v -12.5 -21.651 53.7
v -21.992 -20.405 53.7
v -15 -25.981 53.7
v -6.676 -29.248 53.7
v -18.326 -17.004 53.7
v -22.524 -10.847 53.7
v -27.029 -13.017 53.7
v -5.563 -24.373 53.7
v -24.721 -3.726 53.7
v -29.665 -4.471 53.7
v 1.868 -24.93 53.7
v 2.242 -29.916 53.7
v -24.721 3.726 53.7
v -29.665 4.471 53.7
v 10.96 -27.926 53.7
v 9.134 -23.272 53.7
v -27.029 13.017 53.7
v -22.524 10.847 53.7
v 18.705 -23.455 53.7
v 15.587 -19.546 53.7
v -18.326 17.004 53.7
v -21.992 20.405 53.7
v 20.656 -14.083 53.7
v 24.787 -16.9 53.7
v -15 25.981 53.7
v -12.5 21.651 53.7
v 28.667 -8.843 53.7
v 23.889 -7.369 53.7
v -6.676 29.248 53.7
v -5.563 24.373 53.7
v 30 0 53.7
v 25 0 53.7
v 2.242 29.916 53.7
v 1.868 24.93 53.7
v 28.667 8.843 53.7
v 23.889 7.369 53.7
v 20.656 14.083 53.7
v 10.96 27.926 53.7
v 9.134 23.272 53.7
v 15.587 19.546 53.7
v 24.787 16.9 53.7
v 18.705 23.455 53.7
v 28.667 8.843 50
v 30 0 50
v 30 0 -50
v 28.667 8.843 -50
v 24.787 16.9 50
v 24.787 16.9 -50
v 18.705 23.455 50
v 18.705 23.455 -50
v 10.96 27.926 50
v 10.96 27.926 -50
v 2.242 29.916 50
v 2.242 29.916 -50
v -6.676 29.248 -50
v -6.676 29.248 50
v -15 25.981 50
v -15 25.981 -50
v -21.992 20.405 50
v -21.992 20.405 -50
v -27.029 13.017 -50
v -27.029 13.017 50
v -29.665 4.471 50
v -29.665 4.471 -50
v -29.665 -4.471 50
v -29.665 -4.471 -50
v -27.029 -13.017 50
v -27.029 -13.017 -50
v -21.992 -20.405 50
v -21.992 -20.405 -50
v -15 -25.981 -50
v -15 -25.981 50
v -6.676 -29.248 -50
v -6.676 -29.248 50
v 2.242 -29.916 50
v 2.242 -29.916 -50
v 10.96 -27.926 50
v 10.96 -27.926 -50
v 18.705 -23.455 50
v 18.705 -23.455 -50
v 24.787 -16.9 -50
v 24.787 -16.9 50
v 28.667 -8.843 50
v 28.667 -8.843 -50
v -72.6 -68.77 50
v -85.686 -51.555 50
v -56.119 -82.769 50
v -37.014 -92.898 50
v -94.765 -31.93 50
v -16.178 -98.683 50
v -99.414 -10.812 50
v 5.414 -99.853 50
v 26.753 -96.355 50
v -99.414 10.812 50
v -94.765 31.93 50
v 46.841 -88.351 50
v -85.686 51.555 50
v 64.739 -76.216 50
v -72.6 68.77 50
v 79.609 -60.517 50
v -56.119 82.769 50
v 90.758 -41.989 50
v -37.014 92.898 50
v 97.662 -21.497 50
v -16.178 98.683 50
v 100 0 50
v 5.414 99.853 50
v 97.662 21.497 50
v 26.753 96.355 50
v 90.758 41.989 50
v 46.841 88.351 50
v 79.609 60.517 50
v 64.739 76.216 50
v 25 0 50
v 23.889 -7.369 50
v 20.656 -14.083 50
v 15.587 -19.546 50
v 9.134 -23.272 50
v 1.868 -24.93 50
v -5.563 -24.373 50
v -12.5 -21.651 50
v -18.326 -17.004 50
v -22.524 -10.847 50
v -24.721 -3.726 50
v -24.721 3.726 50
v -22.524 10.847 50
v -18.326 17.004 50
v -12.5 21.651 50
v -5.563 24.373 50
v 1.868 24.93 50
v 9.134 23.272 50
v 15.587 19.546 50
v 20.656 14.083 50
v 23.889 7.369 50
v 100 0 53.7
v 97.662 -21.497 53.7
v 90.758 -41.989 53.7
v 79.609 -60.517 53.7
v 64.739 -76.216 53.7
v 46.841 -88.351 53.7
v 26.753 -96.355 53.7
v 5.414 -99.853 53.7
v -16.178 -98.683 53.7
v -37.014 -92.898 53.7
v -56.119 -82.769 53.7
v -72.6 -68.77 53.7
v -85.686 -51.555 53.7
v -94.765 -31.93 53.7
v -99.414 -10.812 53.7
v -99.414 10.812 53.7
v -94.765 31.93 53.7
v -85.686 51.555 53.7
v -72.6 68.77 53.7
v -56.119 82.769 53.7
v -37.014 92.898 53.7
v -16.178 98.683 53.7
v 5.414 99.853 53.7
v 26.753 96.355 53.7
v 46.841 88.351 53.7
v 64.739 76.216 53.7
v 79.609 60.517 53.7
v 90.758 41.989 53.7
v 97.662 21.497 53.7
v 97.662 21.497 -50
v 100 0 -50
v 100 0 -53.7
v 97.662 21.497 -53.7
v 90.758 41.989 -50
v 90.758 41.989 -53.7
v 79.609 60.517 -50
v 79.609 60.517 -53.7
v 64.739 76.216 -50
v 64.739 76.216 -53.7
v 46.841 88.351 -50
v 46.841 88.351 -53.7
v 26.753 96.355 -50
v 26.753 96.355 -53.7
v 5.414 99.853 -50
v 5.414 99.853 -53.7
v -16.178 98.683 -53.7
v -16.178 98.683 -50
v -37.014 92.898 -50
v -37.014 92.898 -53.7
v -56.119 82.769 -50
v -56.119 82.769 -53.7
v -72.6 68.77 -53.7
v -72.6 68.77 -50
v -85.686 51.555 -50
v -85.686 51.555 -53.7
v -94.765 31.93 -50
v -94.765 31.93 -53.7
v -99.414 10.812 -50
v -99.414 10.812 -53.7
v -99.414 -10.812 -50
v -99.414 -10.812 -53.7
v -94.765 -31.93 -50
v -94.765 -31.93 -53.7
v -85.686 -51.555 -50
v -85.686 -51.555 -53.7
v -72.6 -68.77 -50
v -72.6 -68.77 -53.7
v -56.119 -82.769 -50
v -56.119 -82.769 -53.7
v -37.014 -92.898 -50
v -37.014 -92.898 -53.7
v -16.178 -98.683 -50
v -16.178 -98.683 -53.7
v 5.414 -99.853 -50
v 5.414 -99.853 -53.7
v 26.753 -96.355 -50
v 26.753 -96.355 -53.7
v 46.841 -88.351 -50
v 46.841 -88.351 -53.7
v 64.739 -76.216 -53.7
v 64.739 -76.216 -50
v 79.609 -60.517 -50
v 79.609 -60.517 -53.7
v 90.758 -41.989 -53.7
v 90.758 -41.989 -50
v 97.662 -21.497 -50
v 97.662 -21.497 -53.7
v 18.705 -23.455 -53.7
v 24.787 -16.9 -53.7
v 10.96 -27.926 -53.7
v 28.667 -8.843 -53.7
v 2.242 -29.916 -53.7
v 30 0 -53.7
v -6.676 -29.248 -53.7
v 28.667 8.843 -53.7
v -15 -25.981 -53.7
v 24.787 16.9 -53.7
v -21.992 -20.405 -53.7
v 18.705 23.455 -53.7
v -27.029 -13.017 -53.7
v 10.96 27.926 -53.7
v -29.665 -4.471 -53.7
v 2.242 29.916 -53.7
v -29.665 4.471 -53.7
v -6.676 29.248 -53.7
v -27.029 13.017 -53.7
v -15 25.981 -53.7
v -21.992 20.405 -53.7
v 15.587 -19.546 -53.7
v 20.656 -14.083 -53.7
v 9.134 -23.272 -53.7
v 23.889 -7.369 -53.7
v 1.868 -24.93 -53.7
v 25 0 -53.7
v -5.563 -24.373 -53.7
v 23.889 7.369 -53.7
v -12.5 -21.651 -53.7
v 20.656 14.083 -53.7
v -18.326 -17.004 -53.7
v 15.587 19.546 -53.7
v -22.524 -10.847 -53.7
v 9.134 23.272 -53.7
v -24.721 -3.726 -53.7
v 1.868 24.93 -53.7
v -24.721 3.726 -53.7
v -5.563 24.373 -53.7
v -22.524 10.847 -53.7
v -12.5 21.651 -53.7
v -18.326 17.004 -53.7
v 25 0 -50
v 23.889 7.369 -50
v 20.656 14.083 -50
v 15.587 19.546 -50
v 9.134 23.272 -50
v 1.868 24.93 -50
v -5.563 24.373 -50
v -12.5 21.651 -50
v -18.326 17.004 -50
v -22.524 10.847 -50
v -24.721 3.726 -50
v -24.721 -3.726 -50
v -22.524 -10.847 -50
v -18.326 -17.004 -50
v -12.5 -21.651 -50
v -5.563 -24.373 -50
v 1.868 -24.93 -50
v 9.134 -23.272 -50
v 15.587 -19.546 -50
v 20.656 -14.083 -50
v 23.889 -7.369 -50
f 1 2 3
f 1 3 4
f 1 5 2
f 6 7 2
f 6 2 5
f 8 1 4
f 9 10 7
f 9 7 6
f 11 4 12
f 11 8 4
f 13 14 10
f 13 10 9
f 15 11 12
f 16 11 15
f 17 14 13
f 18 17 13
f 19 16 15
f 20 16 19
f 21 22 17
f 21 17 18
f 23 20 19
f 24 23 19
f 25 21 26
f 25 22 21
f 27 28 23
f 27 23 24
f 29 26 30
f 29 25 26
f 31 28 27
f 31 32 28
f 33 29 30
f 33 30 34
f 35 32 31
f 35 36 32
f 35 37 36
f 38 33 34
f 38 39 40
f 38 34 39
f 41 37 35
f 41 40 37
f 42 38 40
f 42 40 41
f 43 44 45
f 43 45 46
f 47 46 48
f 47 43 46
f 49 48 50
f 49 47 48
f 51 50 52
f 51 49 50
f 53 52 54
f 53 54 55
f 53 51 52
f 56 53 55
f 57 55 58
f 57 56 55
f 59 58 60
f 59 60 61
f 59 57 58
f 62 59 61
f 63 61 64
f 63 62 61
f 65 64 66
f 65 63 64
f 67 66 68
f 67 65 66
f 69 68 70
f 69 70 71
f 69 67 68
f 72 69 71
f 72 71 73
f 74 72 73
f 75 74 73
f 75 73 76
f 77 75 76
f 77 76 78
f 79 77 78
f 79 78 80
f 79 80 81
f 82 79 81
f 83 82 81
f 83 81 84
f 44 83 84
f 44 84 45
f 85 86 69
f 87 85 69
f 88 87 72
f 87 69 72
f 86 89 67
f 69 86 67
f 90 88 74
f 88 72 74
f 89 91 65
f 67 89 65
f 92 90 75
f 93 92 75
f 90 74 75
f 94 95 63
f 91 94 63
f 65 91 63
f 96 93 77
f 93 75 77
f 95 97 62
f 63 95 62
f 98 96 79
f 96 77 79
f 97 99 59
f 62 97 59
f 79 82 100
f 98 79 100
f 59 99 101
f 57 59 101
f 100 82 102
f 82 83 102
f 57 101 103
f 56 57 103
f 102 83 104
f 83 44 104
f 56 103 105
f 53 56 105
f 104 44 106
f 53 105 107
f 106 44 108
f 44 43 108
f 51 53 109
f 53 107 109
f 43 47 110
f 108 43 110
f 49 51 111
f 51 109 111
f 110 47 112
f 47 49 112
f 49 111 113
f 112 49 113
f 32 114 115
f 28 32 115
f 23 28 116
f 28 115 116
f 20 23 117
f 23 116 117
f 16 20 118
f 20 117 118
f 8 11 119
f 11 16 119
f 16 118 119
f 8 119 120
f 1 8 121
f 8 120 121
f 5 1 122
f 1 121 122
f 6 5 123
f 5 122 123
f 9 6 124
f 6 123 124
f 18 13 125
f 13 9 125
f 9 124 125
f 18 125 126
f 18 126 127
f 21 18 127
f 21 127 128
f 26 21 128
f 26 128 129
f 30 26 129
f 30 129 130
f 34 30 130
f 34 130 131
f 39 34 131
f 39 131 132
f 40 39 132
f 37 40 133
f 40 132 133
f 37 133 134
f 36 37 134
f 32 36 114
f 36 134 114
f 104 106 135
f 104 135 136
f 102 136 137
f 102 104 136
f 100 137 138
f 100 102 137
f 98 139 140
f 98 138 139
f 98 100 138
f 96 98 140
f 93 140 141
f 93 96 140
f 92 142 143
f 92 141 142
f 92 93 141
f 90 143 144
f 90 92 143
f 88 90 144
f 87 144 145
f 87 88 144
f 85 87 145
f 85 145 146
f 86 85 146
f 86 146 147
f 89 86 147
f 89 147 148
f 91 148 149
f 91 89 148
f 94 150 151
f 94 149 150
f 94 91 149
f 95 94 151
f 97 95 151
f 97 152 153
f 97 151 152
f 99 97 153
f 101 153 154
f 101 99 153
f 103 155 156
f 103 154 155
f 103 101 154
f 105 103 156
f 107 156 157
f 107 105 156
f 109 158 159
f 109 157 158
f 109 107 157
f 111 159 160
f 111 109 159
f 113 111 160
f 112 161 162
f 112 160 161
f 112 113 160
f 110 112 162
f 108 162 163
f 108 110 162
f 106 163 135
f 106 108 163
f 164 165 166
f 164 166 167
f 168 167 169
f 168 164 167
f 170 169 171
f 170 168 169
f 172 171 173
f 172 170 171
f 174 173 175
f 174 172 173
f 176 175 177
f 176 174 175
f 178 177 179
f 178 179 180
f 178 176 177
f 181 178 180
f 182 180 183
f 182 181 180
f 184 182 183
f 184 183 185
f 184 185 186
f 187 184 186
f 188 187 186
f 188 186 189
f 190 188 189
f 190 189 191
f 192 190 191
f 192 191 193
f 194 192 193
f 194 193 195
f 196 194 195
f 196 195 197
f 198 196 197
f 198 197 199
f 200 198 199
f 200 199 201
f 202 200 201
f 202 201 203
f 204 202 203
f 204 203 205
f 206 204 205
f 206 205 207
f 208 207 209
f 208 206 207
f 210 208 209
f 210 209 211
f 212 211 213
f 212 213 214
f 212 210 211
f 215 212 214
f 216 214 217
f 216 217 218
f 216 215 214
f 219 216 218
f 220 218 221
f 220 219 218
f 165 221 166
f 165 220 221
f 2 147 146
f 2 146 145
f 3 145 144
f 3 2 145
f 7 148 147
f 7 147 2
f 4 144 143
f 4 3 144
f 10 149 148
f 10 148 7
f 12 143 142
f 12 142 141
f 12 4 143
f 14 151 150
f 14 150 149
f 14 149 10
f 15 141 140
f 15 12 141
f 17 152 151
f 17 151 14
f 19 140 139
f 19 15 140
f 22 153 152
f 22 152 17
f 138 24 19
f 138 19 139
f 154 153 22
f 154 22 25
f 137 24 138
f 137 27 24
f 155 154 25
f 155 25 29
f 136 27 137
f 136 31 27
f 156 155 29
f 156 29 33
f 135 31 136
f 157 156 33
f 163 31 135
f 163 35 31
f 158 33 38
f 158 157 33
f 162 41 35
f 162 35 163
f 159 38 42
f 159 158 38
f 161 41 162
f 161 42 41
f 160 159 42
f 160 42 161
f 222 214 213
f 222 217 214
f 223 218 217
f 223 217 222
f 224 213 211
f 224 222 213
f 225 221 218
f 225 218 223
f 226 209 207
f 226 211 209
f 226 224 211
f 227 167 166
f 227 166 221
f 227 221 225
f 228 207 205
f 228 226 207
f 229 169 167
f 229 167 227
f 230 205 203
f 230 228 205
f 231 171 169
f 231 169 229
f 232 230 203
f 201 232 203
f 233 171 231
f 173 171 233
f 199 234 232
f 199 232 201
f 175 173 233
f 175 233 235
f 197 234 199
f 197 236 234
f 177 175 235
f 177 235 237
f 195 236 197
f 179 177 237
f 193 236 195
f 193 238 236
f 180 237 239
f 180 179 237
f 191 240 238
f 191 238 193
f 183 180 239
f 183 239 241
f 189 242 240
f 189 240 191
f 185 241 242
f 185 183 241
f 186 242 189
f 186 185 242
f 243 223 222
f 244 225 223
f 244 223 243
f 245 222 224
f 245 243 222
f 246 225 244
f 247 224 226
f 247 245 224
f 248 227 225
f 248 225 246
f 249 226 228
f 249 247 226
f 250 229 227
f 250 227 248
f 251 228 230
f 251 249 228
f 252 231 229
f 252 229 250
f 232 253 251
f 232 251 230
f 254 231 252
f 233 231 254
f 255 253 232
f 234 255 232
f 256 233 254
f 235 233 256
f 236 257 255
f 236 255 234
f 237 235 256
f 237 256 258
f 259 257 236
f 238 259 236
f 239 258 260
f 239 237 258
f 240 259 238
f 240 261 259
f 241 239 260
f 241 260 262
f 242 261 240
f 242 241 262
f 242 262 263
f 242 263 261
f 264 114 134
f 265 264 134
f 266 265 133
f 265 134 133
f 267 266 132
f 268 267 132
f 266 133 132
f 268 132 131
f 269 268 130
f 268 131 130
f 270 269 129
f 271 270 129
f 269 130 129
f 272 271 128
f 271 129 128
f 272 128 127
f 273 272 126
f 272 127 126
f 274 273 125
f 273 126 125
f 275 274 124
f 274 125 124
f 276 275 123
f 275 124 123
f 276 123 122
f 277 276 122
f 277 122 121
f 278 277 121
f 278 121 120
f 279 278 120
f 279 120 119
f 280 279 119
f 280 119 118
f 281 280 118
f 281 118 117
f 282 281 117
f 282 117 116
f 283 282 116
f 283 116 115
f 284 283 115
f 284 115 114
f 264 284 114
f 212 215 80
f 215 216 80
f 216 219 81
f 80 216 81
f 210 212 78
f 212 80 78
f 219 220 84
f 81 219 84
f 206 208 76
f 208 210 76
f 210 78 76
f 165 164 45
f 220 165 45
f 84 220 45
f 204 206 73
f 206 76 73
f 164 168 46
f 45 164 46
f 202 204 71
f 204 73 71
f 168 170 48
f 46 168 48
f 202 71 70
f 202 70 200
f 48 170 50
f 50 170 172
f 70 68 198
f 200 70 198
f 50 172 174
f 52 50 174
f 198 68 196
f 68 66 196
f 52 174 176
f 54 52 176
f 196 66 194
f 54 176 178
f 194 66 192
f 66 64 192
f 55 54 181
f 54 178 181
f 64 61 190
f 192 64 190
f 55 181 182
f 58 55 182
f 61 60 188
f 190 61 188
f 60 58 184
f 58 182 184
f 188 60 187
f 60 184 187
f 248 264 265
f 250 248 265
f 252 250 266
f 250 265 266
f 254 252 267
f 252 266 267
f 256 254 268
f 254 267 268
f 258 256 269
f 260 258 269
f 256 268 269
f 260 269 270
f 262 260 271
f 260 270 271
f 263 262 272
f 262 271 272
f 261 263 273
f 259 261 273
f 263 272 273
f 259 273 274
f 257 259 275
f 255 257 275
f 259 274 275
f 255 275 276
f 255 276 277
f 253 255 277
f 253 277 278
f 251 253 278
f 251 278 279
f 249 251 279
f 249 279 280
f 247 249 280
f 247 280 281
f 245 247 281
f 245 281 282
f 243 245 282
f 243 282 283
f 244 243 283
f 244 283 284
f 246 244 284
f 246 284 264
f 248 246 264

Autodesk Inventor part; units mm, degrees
ref_plane "YZ Plane" through (0, 0, 0) normal (1, 0, 0) x (0, 1, 0)
ref_plane "XZ Plane" through (0, 0, 0) normal (0, 1, 0) x (-1, 0, 0)
ref_plane "XY Plane" through (0, 0, 0) normal (0, 0, 1) x (1, 0, 0)
sketch "Sketch1" plane through (0, 0, 0) normal (0, 0, 1) x (1, 0, 0)
  circle A0 centre (0, 0) radius 25
  circle A1 centre (0, 0) radius 100
  circle A2 centre (0, 0) radius 30
  dimension "d0" = 50
  dimension "d1" = 200
  dimension "d2" = 5
extrude "Extrusion1" add sketch "Sketch1" along normal blind 3.7 contours A1 | A2
move or copy body "Move Body1" bodies to move or copy 1 copy no translate (0, 0, 50)
mirror "Mirror1" about plane through (0, 0, 0) normal (0, 0, 1)
extrude "Extrusion2" add sketch "Sketch1" against normal up to surface (107.4 mm away) from surface at 53.7 contours A2
properties part number "roll" material "Plywood, Finish"
